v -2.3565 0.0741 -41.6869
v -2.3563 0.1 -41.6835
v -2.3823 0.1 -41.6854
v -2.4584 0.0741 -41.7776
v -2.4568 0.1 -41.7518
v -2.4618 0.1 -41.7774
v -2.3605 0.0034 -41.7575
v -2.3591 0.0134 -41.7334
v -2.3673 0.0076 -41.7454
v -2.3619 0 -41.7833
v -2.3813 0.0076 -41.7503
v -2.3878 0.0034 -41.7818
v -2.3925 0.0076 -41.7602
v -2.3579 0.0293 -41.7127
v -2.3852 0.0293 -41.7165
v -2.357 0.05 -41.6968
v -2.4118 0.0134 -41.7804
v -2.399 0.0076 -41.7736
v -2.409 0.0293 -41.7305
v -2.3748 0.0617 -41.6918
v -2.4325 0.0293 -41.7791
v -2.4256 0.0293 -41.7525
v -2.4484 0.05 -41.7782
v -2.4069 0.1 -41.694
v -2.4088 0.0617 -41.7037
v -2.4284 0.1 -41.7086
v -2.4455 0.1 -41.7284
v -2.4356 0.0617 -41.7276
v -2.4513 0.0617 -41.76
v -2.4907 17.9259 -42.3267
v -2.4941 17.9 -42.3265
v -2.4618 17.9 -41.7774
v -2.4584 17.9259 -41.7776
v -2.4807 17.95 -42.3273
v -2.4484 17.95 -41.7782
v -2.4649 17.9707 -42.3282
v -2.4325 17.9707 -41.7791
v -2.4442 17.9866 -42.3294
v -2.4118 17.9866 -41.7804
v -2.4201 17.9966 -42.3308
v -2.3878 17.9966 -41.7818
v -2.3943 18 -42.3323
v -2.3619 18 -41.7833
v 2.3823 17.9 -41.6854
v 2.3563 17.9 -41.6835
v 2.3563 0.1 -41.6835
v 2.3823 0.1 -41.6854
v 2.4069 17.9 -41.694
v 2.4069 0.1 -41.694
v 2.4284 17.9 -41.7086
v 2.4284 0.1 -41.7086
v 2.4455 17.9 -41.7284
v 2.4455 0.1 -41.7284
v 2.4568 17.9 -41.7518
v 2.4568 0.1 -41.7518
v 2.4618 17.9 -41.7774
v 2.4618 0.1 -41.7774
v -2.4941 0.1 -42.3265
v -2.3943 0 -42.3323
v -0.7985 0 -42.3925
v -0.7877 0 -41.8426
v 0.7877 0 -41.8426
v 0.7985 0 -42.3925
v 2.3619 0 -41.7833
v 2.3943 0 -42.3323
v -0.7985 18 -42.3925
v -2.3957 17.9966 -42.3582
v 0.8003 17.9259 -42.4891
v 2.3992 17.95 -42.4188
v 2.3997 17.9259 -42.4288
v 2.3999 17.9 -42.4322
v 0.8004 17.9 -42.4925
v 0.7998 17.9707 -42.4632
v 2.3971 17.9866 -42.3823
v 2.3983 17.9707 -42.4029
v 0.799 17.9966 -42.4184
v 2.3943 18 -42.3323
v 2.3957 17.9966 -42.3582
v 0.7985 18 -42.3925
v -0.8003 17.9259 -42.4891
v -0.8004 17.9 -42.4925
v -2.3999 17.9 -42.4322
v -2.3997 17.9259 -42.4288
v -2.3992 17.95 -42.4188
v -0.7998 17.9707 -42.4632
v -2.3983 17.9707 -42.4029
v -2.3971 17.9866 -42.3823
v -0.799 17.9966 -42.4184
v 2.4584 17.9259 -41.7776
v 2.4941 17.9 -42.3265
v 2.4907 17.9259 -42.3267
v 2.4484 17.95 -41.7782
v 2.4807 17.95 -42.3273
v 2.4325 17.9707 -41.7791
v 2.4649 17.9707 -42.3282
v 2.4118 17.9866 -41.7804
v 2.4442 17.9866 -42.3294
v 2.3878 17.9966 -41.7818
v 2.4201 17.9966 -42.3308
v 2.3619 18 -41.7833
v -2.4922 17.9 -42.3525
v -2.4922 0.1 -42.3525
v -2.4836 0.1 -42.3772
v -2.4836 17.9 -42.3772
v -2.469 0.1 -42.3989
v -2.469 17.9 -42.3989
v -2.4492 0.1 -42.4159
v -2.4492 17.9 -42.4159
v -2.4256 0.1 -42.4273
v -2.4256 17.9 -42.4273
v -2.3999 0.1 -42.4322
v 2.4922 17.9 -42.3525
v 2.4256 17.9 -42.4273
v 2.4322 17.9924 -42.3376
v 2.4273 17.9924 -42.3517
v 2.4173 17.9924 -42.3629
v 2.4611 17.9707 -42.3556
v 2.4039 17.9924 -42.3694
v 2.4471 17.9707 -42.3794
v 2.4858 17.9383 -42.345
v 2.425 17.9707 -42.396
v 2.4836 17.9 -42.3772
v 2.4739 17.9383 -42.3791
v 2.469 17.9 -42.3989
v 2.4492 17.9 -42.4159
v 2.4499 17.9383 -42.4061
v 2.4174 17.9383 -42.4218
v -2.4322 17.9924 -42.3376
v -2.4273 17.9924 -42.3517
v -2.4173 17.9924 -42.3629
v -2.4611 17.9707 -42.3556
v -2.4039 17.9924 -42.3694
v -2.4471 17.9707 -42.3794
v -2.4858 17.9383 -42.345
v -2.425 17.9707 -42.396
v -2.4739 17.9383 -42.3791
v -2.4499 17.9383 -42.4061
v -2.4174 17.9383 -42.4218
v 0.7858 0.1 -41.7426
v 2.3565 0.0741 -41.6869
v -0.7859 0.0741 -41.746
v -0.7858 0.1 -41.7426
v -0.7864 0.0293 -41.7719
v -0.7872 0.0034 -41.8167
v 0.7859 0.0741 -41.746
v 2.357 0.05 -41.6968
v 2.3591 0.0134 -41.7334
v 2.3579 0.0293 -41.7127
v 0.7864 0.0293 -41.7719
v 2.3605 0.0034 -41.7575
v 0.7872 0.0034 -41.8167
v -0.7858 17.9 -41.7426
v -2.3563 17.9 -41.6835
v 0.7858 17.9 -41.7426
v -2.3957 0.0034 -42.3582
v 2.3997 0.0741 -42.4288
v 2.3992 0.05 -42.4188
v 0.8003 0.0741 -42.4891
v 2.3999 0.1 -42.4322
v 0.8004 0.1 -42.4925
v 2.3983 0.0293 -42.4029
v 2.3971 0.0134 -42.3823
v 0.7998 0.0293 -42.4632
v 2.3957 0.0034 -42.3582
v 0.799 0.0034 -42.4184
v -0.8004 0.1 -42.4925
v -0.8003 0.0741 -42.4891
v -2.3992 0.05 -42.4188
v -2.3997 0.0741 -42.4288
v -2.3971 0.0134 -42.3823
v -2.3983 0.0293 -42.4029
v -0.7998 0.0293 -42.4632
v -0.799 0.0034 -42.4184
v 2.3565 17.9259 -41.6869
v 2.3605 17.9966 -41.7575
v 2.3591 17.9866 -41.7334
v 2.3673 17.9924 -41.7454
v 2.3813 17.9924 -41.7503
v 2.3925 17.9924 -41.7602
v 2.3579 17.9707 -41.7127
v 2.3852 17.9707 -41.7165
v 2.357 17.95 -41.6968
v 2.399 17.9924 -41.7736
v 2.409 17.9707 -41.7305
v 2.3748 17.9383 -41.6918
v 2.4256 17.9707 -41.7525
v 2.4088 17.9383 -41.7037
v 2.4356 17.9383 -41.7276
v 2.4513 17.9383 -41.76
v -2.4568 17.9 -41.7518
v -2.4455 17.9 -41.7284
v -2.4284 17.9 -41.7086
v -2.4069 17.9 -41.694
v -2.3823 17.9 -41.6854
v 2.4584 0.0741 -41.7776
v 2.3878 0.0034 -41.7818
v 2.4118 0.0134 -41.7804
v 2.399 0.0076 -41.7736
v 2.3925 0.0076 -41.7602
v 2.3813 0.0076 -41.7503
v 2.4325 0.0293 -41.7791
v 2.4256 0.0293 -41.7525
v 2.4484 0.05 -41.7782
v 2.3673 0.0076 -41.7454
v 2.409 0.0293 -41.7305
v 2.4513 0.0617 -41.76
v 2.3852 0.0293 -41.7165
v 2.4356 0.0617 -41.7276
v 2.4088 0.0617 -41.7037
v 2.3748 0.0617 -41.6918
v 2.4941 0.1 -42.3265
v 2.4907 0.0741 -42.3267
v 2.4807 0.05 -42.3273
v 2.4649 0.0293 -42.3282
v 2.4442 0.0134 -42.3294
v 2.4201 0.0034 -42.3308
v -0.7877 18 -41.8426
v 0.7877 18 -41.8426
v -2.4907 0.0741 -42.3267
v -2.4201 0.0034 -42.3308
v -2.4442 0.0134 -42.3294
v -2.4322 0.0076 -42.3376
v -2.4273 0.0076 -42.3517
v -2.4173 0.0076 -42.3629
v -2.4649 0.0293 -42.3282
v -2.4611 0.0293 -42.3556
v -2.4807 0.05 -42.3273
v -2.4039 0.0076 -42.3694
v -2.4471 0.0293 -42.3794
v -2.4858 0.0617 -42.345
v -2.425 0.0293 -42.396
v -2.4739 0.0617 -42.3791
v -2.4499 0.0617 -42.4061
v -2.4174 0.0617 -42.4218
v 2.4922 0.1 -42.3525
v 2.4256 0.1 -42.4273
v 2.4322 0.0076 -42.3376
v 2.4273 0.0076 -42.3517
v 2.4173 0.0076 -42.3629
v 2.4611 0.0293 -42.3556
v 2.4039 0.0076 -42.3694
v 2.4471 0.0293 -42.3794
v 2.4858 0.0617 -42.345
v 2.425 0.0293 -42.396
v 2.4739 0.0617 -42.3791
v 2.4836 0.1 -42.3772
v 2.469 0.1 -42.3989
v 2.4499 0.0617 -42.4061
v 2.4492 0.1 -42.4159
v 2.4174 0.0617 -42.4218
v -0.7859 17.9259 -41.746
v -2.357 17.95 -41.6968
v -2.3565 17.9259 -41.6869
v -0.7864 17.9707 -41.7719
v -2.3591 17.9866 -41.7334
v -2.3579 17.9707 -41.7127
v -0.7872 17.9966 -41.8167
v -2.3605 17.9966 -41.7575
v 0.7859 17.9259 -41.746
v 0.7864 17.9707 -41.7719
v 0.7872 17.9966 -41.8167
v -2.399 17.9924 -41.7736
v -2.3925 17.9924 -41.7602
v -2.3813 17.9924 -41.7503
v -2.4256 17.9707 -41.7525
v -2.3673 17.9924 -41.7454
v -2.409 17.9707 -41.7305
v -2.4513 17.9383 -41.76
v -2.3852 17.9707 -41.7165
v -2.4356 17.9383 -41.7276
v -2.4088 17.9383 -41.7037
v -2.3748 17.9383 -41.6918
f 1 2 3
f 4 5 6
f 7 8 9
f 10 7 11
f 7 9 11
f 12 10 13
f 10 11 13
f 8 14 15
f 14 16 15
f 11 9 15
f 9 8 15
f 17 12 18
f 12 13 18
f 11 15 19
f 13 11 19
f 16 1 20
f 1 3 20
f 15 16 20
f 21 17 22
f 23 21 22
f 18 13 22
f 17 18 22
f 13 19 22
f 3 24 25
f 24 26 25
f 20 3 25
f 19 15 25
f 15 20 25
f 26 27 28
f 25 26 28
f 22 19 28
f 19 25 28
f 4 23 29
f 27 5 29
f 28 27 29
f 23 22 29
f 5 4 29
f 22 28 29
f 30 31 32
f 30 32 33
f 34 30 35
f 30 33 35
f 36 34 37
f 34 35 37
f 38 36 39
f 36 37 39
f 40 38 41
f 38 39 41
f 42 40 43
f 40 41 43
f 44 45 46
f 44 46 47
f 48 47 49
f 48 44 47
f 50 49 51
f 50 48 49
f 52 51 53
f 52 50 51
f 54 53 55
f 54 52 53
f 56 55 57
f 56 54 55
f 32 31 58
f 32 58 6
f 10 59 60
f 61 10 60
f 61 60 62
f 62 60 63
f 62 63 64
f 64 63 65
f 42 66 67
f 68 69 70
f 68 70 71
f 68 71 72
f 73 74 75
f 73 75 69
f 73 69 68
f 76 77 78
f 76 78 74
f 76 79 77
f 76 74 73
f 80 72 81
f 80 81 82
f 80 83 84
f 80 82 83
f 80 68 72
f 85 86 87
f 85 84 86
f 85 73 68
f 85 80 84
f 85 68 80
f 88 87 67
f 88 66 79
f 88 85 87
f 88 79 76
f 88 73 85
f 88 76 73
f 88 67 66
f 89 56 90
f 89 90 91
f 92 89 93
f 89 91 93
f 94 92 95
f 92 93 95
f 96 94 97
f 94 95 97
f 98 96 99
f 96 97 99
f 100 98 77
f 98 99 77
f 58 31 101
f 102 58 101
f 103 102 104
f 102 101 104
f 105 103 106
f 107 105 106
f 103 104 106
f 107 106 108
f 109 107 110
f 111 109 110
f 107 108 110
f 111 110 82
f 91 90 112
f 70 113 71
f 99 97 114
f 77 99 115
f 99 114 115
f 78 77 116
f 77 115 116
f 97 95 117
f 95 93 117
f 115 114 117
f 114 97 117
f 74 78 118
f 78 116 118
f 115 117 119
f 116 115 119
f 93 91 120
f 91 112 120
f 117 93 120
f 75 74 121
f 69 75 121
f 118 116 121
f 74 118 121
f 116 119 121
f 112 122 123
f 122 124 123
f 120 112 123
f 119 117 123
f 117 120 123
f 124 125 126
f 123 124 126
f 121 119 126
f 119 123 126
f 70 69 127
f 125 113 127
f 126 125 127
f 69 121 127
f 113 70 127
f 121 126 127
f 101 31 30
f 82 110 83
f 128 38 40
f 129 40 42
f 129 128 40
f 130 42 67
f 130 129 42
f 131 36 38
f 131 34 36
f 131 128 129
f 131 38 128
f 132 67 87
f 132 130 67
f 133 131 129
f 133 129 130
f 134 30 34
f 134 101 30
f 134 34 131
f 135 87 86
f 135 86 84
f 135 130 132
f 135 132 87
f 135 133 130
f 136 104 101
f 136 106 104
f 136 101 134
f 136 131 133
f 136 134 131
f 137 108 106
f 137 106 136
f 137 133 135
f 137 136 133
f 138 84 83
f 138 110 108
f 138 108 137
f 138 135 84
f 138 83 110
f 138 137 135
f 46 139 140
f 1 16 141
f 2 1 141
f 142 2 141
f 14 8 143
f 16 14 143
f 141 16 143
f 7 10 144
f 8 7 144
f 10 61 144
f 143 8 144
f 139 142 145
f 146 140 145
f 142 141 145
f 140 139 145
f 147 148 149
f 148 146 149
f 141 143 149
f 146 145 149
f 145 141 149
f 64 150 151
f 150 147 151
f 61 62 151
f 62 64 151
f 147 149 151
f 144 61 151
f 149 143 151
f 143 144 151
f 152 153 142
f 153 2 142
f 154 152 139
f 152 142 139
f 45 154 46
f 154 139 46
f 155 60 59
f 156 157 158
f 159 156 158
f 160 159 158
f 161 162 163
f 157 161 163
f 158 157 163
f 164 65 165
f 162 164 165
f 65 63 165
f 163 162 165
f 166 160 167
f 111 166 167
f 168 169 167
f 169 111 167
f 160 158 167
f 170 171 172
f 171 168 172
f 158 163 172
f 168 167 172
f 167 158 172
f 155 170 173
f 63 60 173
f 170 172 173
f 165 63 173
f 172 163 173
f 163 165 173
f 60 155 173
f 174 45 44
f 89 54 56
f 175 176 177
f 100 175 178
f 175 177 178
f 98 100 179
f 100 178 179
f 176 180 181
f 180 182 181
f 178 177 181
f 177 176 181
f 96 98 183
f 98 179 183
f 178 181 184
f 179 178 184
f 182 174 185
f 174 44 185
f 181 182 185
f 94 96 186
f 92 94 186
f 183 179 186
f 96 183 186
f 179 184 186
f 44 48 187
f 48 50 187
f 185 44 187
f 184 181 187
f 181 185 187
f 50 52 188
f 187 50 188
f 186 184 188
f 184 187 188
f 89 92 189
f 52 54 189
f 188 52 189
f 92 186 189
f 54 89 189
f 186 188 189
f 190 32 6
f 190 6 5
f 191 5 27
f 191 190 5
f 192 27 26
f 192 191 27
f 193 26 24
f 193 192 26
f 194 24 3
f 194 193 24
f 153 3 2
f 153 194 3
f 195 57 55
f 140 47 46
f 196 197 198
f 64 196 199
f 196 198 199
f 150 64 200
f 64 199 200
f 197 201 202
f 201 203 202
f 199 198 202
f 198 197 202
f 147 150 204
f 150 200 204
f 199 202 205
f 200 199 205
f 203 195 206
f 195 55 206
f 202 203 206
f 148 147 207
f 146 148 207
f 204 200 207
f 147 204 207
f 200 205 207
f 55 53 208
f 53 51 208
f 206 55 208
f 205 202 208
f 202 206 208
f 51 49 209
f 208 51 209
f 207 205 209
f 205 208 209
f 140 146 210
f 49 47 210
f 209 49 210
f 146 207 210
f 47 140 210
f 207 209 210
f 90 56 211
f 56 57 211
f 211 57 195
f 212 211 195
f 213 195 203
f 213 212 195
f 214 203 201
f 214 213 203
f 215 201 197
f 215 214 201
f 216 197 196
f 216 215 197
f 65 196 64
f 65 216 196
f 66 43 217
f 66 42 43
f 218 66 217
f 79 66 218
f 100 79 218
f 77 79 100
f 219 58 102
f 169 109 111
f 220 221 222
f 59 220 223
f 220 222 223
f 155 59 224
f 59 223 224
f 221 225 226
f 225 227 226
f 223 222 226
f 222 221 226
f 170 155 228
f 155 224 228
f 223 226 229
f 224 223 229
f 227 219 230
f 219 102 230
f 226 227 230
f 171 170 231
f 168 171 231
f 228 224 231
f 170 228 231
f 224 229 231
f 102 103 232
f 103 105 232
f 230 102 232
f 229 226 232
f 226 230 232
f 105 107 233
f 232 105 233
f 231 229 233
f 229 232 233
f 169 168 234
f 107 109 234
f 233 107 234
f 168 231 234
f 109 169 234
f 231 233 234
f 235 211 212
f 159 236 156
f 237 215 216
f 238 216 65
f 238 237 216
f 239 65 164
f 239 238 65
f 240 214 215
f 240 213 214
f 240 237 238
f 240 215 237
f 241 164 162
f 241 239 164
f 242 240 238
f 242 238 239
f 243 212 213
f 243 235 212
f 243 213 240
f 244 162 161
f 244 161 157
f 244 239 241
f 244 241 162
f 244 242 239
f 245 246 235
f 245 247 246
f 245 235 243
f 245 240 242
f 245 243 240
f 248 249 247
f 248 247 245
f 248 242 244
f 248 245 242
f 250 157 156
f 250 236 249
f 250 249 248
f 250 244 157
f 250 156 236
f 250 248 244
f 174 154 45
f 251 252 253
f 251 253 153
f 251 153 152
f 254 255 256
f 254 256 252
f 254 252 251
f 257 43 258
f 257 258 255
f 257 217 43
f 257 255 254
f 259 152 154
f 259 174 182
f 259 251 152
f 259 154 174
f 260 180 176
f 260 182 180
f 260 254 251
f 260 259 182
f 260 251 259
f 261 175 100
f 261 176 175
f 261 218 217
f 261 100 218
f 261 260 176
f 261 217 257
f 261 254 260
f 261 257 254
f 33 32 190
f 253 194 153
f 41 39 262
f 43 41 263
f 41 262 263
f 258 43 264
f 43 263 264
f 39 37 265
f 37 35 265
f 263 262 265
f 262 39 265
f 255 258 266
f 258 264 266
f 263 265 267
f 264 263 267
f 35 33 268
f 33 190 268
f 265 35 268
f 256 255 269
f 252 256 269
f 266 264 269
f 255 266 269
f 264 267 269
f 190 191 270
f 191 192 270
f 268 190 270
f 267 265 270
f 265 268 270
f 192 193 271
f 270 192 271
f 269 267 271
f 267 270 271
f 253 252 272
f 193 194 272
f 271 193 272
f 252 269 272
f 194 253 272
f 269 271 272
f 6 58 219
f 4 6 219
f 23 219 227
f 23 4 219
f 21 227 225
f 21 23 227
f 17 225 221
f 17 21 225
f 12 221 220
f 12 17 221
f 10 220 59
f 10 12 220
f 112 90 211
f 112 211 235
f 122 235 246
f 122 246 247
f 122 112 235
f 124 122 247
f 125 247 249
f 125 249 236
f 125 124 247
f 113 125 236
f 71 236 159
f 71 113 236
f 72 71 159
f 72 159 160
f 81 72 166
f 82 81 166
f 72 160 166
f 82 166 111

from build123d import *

# Parameters (mm, degrees)
P_IDAT_VYSUNUT_M1_DEPTH = 18
ZAOBLIT1_R              = 0.1


with BuildPart() as part:
    # Skica1 → Přidat vysunutím1 (new body)
    with BuildSketch(Plane(origin=(0, 0, 0), x_dir=(1, 0, 0), z_dir=(0, 1, 0))):
        with BuildLine():
            Line((-2.5, 42.426406871), (-2.455882353, 41.677705573))
            ThreePointArc((-2.455882353, 41.677705573), (0, 41.75), (2.455882353, 41.677705573))
            Line((2.455882353, 41.677705573), (2.5, 42.426406871))
            ThreePointArc((2.5, 42.426406871), (0, 42.5), (-2.5, 42.426406871))
        make_face()
    extrude(amount=P_IDAT_VYSUNUT_M1_DEPTH)

    # Zaoblit1
    zaoblit1_edges = [part.edges().sort_by_distance(p)[0] for p in [
        (0, 18, -41.75),
        (2.477941176, 18, -42.052056222),
        (0, 18, -42.5),
        (2.477941176, 0, -42.052056222),
        (0, 0, -41.75),
        (-2.477941176, 0, -42.052056222),
        (0, 0, -42.5),
        (2.5, 9, -42.426406871),
        (2.455882353, 9, -41.677705573),
        (-2.455882353, 9, -41.677705573),
        (-2.5, 9, -42.426406871),
        (-2.477941176, 18, -42.052056222),
    ]]
    fillet(zaoblit1_edges, radius=ZAOBLIT1_R)


solid = part.part
